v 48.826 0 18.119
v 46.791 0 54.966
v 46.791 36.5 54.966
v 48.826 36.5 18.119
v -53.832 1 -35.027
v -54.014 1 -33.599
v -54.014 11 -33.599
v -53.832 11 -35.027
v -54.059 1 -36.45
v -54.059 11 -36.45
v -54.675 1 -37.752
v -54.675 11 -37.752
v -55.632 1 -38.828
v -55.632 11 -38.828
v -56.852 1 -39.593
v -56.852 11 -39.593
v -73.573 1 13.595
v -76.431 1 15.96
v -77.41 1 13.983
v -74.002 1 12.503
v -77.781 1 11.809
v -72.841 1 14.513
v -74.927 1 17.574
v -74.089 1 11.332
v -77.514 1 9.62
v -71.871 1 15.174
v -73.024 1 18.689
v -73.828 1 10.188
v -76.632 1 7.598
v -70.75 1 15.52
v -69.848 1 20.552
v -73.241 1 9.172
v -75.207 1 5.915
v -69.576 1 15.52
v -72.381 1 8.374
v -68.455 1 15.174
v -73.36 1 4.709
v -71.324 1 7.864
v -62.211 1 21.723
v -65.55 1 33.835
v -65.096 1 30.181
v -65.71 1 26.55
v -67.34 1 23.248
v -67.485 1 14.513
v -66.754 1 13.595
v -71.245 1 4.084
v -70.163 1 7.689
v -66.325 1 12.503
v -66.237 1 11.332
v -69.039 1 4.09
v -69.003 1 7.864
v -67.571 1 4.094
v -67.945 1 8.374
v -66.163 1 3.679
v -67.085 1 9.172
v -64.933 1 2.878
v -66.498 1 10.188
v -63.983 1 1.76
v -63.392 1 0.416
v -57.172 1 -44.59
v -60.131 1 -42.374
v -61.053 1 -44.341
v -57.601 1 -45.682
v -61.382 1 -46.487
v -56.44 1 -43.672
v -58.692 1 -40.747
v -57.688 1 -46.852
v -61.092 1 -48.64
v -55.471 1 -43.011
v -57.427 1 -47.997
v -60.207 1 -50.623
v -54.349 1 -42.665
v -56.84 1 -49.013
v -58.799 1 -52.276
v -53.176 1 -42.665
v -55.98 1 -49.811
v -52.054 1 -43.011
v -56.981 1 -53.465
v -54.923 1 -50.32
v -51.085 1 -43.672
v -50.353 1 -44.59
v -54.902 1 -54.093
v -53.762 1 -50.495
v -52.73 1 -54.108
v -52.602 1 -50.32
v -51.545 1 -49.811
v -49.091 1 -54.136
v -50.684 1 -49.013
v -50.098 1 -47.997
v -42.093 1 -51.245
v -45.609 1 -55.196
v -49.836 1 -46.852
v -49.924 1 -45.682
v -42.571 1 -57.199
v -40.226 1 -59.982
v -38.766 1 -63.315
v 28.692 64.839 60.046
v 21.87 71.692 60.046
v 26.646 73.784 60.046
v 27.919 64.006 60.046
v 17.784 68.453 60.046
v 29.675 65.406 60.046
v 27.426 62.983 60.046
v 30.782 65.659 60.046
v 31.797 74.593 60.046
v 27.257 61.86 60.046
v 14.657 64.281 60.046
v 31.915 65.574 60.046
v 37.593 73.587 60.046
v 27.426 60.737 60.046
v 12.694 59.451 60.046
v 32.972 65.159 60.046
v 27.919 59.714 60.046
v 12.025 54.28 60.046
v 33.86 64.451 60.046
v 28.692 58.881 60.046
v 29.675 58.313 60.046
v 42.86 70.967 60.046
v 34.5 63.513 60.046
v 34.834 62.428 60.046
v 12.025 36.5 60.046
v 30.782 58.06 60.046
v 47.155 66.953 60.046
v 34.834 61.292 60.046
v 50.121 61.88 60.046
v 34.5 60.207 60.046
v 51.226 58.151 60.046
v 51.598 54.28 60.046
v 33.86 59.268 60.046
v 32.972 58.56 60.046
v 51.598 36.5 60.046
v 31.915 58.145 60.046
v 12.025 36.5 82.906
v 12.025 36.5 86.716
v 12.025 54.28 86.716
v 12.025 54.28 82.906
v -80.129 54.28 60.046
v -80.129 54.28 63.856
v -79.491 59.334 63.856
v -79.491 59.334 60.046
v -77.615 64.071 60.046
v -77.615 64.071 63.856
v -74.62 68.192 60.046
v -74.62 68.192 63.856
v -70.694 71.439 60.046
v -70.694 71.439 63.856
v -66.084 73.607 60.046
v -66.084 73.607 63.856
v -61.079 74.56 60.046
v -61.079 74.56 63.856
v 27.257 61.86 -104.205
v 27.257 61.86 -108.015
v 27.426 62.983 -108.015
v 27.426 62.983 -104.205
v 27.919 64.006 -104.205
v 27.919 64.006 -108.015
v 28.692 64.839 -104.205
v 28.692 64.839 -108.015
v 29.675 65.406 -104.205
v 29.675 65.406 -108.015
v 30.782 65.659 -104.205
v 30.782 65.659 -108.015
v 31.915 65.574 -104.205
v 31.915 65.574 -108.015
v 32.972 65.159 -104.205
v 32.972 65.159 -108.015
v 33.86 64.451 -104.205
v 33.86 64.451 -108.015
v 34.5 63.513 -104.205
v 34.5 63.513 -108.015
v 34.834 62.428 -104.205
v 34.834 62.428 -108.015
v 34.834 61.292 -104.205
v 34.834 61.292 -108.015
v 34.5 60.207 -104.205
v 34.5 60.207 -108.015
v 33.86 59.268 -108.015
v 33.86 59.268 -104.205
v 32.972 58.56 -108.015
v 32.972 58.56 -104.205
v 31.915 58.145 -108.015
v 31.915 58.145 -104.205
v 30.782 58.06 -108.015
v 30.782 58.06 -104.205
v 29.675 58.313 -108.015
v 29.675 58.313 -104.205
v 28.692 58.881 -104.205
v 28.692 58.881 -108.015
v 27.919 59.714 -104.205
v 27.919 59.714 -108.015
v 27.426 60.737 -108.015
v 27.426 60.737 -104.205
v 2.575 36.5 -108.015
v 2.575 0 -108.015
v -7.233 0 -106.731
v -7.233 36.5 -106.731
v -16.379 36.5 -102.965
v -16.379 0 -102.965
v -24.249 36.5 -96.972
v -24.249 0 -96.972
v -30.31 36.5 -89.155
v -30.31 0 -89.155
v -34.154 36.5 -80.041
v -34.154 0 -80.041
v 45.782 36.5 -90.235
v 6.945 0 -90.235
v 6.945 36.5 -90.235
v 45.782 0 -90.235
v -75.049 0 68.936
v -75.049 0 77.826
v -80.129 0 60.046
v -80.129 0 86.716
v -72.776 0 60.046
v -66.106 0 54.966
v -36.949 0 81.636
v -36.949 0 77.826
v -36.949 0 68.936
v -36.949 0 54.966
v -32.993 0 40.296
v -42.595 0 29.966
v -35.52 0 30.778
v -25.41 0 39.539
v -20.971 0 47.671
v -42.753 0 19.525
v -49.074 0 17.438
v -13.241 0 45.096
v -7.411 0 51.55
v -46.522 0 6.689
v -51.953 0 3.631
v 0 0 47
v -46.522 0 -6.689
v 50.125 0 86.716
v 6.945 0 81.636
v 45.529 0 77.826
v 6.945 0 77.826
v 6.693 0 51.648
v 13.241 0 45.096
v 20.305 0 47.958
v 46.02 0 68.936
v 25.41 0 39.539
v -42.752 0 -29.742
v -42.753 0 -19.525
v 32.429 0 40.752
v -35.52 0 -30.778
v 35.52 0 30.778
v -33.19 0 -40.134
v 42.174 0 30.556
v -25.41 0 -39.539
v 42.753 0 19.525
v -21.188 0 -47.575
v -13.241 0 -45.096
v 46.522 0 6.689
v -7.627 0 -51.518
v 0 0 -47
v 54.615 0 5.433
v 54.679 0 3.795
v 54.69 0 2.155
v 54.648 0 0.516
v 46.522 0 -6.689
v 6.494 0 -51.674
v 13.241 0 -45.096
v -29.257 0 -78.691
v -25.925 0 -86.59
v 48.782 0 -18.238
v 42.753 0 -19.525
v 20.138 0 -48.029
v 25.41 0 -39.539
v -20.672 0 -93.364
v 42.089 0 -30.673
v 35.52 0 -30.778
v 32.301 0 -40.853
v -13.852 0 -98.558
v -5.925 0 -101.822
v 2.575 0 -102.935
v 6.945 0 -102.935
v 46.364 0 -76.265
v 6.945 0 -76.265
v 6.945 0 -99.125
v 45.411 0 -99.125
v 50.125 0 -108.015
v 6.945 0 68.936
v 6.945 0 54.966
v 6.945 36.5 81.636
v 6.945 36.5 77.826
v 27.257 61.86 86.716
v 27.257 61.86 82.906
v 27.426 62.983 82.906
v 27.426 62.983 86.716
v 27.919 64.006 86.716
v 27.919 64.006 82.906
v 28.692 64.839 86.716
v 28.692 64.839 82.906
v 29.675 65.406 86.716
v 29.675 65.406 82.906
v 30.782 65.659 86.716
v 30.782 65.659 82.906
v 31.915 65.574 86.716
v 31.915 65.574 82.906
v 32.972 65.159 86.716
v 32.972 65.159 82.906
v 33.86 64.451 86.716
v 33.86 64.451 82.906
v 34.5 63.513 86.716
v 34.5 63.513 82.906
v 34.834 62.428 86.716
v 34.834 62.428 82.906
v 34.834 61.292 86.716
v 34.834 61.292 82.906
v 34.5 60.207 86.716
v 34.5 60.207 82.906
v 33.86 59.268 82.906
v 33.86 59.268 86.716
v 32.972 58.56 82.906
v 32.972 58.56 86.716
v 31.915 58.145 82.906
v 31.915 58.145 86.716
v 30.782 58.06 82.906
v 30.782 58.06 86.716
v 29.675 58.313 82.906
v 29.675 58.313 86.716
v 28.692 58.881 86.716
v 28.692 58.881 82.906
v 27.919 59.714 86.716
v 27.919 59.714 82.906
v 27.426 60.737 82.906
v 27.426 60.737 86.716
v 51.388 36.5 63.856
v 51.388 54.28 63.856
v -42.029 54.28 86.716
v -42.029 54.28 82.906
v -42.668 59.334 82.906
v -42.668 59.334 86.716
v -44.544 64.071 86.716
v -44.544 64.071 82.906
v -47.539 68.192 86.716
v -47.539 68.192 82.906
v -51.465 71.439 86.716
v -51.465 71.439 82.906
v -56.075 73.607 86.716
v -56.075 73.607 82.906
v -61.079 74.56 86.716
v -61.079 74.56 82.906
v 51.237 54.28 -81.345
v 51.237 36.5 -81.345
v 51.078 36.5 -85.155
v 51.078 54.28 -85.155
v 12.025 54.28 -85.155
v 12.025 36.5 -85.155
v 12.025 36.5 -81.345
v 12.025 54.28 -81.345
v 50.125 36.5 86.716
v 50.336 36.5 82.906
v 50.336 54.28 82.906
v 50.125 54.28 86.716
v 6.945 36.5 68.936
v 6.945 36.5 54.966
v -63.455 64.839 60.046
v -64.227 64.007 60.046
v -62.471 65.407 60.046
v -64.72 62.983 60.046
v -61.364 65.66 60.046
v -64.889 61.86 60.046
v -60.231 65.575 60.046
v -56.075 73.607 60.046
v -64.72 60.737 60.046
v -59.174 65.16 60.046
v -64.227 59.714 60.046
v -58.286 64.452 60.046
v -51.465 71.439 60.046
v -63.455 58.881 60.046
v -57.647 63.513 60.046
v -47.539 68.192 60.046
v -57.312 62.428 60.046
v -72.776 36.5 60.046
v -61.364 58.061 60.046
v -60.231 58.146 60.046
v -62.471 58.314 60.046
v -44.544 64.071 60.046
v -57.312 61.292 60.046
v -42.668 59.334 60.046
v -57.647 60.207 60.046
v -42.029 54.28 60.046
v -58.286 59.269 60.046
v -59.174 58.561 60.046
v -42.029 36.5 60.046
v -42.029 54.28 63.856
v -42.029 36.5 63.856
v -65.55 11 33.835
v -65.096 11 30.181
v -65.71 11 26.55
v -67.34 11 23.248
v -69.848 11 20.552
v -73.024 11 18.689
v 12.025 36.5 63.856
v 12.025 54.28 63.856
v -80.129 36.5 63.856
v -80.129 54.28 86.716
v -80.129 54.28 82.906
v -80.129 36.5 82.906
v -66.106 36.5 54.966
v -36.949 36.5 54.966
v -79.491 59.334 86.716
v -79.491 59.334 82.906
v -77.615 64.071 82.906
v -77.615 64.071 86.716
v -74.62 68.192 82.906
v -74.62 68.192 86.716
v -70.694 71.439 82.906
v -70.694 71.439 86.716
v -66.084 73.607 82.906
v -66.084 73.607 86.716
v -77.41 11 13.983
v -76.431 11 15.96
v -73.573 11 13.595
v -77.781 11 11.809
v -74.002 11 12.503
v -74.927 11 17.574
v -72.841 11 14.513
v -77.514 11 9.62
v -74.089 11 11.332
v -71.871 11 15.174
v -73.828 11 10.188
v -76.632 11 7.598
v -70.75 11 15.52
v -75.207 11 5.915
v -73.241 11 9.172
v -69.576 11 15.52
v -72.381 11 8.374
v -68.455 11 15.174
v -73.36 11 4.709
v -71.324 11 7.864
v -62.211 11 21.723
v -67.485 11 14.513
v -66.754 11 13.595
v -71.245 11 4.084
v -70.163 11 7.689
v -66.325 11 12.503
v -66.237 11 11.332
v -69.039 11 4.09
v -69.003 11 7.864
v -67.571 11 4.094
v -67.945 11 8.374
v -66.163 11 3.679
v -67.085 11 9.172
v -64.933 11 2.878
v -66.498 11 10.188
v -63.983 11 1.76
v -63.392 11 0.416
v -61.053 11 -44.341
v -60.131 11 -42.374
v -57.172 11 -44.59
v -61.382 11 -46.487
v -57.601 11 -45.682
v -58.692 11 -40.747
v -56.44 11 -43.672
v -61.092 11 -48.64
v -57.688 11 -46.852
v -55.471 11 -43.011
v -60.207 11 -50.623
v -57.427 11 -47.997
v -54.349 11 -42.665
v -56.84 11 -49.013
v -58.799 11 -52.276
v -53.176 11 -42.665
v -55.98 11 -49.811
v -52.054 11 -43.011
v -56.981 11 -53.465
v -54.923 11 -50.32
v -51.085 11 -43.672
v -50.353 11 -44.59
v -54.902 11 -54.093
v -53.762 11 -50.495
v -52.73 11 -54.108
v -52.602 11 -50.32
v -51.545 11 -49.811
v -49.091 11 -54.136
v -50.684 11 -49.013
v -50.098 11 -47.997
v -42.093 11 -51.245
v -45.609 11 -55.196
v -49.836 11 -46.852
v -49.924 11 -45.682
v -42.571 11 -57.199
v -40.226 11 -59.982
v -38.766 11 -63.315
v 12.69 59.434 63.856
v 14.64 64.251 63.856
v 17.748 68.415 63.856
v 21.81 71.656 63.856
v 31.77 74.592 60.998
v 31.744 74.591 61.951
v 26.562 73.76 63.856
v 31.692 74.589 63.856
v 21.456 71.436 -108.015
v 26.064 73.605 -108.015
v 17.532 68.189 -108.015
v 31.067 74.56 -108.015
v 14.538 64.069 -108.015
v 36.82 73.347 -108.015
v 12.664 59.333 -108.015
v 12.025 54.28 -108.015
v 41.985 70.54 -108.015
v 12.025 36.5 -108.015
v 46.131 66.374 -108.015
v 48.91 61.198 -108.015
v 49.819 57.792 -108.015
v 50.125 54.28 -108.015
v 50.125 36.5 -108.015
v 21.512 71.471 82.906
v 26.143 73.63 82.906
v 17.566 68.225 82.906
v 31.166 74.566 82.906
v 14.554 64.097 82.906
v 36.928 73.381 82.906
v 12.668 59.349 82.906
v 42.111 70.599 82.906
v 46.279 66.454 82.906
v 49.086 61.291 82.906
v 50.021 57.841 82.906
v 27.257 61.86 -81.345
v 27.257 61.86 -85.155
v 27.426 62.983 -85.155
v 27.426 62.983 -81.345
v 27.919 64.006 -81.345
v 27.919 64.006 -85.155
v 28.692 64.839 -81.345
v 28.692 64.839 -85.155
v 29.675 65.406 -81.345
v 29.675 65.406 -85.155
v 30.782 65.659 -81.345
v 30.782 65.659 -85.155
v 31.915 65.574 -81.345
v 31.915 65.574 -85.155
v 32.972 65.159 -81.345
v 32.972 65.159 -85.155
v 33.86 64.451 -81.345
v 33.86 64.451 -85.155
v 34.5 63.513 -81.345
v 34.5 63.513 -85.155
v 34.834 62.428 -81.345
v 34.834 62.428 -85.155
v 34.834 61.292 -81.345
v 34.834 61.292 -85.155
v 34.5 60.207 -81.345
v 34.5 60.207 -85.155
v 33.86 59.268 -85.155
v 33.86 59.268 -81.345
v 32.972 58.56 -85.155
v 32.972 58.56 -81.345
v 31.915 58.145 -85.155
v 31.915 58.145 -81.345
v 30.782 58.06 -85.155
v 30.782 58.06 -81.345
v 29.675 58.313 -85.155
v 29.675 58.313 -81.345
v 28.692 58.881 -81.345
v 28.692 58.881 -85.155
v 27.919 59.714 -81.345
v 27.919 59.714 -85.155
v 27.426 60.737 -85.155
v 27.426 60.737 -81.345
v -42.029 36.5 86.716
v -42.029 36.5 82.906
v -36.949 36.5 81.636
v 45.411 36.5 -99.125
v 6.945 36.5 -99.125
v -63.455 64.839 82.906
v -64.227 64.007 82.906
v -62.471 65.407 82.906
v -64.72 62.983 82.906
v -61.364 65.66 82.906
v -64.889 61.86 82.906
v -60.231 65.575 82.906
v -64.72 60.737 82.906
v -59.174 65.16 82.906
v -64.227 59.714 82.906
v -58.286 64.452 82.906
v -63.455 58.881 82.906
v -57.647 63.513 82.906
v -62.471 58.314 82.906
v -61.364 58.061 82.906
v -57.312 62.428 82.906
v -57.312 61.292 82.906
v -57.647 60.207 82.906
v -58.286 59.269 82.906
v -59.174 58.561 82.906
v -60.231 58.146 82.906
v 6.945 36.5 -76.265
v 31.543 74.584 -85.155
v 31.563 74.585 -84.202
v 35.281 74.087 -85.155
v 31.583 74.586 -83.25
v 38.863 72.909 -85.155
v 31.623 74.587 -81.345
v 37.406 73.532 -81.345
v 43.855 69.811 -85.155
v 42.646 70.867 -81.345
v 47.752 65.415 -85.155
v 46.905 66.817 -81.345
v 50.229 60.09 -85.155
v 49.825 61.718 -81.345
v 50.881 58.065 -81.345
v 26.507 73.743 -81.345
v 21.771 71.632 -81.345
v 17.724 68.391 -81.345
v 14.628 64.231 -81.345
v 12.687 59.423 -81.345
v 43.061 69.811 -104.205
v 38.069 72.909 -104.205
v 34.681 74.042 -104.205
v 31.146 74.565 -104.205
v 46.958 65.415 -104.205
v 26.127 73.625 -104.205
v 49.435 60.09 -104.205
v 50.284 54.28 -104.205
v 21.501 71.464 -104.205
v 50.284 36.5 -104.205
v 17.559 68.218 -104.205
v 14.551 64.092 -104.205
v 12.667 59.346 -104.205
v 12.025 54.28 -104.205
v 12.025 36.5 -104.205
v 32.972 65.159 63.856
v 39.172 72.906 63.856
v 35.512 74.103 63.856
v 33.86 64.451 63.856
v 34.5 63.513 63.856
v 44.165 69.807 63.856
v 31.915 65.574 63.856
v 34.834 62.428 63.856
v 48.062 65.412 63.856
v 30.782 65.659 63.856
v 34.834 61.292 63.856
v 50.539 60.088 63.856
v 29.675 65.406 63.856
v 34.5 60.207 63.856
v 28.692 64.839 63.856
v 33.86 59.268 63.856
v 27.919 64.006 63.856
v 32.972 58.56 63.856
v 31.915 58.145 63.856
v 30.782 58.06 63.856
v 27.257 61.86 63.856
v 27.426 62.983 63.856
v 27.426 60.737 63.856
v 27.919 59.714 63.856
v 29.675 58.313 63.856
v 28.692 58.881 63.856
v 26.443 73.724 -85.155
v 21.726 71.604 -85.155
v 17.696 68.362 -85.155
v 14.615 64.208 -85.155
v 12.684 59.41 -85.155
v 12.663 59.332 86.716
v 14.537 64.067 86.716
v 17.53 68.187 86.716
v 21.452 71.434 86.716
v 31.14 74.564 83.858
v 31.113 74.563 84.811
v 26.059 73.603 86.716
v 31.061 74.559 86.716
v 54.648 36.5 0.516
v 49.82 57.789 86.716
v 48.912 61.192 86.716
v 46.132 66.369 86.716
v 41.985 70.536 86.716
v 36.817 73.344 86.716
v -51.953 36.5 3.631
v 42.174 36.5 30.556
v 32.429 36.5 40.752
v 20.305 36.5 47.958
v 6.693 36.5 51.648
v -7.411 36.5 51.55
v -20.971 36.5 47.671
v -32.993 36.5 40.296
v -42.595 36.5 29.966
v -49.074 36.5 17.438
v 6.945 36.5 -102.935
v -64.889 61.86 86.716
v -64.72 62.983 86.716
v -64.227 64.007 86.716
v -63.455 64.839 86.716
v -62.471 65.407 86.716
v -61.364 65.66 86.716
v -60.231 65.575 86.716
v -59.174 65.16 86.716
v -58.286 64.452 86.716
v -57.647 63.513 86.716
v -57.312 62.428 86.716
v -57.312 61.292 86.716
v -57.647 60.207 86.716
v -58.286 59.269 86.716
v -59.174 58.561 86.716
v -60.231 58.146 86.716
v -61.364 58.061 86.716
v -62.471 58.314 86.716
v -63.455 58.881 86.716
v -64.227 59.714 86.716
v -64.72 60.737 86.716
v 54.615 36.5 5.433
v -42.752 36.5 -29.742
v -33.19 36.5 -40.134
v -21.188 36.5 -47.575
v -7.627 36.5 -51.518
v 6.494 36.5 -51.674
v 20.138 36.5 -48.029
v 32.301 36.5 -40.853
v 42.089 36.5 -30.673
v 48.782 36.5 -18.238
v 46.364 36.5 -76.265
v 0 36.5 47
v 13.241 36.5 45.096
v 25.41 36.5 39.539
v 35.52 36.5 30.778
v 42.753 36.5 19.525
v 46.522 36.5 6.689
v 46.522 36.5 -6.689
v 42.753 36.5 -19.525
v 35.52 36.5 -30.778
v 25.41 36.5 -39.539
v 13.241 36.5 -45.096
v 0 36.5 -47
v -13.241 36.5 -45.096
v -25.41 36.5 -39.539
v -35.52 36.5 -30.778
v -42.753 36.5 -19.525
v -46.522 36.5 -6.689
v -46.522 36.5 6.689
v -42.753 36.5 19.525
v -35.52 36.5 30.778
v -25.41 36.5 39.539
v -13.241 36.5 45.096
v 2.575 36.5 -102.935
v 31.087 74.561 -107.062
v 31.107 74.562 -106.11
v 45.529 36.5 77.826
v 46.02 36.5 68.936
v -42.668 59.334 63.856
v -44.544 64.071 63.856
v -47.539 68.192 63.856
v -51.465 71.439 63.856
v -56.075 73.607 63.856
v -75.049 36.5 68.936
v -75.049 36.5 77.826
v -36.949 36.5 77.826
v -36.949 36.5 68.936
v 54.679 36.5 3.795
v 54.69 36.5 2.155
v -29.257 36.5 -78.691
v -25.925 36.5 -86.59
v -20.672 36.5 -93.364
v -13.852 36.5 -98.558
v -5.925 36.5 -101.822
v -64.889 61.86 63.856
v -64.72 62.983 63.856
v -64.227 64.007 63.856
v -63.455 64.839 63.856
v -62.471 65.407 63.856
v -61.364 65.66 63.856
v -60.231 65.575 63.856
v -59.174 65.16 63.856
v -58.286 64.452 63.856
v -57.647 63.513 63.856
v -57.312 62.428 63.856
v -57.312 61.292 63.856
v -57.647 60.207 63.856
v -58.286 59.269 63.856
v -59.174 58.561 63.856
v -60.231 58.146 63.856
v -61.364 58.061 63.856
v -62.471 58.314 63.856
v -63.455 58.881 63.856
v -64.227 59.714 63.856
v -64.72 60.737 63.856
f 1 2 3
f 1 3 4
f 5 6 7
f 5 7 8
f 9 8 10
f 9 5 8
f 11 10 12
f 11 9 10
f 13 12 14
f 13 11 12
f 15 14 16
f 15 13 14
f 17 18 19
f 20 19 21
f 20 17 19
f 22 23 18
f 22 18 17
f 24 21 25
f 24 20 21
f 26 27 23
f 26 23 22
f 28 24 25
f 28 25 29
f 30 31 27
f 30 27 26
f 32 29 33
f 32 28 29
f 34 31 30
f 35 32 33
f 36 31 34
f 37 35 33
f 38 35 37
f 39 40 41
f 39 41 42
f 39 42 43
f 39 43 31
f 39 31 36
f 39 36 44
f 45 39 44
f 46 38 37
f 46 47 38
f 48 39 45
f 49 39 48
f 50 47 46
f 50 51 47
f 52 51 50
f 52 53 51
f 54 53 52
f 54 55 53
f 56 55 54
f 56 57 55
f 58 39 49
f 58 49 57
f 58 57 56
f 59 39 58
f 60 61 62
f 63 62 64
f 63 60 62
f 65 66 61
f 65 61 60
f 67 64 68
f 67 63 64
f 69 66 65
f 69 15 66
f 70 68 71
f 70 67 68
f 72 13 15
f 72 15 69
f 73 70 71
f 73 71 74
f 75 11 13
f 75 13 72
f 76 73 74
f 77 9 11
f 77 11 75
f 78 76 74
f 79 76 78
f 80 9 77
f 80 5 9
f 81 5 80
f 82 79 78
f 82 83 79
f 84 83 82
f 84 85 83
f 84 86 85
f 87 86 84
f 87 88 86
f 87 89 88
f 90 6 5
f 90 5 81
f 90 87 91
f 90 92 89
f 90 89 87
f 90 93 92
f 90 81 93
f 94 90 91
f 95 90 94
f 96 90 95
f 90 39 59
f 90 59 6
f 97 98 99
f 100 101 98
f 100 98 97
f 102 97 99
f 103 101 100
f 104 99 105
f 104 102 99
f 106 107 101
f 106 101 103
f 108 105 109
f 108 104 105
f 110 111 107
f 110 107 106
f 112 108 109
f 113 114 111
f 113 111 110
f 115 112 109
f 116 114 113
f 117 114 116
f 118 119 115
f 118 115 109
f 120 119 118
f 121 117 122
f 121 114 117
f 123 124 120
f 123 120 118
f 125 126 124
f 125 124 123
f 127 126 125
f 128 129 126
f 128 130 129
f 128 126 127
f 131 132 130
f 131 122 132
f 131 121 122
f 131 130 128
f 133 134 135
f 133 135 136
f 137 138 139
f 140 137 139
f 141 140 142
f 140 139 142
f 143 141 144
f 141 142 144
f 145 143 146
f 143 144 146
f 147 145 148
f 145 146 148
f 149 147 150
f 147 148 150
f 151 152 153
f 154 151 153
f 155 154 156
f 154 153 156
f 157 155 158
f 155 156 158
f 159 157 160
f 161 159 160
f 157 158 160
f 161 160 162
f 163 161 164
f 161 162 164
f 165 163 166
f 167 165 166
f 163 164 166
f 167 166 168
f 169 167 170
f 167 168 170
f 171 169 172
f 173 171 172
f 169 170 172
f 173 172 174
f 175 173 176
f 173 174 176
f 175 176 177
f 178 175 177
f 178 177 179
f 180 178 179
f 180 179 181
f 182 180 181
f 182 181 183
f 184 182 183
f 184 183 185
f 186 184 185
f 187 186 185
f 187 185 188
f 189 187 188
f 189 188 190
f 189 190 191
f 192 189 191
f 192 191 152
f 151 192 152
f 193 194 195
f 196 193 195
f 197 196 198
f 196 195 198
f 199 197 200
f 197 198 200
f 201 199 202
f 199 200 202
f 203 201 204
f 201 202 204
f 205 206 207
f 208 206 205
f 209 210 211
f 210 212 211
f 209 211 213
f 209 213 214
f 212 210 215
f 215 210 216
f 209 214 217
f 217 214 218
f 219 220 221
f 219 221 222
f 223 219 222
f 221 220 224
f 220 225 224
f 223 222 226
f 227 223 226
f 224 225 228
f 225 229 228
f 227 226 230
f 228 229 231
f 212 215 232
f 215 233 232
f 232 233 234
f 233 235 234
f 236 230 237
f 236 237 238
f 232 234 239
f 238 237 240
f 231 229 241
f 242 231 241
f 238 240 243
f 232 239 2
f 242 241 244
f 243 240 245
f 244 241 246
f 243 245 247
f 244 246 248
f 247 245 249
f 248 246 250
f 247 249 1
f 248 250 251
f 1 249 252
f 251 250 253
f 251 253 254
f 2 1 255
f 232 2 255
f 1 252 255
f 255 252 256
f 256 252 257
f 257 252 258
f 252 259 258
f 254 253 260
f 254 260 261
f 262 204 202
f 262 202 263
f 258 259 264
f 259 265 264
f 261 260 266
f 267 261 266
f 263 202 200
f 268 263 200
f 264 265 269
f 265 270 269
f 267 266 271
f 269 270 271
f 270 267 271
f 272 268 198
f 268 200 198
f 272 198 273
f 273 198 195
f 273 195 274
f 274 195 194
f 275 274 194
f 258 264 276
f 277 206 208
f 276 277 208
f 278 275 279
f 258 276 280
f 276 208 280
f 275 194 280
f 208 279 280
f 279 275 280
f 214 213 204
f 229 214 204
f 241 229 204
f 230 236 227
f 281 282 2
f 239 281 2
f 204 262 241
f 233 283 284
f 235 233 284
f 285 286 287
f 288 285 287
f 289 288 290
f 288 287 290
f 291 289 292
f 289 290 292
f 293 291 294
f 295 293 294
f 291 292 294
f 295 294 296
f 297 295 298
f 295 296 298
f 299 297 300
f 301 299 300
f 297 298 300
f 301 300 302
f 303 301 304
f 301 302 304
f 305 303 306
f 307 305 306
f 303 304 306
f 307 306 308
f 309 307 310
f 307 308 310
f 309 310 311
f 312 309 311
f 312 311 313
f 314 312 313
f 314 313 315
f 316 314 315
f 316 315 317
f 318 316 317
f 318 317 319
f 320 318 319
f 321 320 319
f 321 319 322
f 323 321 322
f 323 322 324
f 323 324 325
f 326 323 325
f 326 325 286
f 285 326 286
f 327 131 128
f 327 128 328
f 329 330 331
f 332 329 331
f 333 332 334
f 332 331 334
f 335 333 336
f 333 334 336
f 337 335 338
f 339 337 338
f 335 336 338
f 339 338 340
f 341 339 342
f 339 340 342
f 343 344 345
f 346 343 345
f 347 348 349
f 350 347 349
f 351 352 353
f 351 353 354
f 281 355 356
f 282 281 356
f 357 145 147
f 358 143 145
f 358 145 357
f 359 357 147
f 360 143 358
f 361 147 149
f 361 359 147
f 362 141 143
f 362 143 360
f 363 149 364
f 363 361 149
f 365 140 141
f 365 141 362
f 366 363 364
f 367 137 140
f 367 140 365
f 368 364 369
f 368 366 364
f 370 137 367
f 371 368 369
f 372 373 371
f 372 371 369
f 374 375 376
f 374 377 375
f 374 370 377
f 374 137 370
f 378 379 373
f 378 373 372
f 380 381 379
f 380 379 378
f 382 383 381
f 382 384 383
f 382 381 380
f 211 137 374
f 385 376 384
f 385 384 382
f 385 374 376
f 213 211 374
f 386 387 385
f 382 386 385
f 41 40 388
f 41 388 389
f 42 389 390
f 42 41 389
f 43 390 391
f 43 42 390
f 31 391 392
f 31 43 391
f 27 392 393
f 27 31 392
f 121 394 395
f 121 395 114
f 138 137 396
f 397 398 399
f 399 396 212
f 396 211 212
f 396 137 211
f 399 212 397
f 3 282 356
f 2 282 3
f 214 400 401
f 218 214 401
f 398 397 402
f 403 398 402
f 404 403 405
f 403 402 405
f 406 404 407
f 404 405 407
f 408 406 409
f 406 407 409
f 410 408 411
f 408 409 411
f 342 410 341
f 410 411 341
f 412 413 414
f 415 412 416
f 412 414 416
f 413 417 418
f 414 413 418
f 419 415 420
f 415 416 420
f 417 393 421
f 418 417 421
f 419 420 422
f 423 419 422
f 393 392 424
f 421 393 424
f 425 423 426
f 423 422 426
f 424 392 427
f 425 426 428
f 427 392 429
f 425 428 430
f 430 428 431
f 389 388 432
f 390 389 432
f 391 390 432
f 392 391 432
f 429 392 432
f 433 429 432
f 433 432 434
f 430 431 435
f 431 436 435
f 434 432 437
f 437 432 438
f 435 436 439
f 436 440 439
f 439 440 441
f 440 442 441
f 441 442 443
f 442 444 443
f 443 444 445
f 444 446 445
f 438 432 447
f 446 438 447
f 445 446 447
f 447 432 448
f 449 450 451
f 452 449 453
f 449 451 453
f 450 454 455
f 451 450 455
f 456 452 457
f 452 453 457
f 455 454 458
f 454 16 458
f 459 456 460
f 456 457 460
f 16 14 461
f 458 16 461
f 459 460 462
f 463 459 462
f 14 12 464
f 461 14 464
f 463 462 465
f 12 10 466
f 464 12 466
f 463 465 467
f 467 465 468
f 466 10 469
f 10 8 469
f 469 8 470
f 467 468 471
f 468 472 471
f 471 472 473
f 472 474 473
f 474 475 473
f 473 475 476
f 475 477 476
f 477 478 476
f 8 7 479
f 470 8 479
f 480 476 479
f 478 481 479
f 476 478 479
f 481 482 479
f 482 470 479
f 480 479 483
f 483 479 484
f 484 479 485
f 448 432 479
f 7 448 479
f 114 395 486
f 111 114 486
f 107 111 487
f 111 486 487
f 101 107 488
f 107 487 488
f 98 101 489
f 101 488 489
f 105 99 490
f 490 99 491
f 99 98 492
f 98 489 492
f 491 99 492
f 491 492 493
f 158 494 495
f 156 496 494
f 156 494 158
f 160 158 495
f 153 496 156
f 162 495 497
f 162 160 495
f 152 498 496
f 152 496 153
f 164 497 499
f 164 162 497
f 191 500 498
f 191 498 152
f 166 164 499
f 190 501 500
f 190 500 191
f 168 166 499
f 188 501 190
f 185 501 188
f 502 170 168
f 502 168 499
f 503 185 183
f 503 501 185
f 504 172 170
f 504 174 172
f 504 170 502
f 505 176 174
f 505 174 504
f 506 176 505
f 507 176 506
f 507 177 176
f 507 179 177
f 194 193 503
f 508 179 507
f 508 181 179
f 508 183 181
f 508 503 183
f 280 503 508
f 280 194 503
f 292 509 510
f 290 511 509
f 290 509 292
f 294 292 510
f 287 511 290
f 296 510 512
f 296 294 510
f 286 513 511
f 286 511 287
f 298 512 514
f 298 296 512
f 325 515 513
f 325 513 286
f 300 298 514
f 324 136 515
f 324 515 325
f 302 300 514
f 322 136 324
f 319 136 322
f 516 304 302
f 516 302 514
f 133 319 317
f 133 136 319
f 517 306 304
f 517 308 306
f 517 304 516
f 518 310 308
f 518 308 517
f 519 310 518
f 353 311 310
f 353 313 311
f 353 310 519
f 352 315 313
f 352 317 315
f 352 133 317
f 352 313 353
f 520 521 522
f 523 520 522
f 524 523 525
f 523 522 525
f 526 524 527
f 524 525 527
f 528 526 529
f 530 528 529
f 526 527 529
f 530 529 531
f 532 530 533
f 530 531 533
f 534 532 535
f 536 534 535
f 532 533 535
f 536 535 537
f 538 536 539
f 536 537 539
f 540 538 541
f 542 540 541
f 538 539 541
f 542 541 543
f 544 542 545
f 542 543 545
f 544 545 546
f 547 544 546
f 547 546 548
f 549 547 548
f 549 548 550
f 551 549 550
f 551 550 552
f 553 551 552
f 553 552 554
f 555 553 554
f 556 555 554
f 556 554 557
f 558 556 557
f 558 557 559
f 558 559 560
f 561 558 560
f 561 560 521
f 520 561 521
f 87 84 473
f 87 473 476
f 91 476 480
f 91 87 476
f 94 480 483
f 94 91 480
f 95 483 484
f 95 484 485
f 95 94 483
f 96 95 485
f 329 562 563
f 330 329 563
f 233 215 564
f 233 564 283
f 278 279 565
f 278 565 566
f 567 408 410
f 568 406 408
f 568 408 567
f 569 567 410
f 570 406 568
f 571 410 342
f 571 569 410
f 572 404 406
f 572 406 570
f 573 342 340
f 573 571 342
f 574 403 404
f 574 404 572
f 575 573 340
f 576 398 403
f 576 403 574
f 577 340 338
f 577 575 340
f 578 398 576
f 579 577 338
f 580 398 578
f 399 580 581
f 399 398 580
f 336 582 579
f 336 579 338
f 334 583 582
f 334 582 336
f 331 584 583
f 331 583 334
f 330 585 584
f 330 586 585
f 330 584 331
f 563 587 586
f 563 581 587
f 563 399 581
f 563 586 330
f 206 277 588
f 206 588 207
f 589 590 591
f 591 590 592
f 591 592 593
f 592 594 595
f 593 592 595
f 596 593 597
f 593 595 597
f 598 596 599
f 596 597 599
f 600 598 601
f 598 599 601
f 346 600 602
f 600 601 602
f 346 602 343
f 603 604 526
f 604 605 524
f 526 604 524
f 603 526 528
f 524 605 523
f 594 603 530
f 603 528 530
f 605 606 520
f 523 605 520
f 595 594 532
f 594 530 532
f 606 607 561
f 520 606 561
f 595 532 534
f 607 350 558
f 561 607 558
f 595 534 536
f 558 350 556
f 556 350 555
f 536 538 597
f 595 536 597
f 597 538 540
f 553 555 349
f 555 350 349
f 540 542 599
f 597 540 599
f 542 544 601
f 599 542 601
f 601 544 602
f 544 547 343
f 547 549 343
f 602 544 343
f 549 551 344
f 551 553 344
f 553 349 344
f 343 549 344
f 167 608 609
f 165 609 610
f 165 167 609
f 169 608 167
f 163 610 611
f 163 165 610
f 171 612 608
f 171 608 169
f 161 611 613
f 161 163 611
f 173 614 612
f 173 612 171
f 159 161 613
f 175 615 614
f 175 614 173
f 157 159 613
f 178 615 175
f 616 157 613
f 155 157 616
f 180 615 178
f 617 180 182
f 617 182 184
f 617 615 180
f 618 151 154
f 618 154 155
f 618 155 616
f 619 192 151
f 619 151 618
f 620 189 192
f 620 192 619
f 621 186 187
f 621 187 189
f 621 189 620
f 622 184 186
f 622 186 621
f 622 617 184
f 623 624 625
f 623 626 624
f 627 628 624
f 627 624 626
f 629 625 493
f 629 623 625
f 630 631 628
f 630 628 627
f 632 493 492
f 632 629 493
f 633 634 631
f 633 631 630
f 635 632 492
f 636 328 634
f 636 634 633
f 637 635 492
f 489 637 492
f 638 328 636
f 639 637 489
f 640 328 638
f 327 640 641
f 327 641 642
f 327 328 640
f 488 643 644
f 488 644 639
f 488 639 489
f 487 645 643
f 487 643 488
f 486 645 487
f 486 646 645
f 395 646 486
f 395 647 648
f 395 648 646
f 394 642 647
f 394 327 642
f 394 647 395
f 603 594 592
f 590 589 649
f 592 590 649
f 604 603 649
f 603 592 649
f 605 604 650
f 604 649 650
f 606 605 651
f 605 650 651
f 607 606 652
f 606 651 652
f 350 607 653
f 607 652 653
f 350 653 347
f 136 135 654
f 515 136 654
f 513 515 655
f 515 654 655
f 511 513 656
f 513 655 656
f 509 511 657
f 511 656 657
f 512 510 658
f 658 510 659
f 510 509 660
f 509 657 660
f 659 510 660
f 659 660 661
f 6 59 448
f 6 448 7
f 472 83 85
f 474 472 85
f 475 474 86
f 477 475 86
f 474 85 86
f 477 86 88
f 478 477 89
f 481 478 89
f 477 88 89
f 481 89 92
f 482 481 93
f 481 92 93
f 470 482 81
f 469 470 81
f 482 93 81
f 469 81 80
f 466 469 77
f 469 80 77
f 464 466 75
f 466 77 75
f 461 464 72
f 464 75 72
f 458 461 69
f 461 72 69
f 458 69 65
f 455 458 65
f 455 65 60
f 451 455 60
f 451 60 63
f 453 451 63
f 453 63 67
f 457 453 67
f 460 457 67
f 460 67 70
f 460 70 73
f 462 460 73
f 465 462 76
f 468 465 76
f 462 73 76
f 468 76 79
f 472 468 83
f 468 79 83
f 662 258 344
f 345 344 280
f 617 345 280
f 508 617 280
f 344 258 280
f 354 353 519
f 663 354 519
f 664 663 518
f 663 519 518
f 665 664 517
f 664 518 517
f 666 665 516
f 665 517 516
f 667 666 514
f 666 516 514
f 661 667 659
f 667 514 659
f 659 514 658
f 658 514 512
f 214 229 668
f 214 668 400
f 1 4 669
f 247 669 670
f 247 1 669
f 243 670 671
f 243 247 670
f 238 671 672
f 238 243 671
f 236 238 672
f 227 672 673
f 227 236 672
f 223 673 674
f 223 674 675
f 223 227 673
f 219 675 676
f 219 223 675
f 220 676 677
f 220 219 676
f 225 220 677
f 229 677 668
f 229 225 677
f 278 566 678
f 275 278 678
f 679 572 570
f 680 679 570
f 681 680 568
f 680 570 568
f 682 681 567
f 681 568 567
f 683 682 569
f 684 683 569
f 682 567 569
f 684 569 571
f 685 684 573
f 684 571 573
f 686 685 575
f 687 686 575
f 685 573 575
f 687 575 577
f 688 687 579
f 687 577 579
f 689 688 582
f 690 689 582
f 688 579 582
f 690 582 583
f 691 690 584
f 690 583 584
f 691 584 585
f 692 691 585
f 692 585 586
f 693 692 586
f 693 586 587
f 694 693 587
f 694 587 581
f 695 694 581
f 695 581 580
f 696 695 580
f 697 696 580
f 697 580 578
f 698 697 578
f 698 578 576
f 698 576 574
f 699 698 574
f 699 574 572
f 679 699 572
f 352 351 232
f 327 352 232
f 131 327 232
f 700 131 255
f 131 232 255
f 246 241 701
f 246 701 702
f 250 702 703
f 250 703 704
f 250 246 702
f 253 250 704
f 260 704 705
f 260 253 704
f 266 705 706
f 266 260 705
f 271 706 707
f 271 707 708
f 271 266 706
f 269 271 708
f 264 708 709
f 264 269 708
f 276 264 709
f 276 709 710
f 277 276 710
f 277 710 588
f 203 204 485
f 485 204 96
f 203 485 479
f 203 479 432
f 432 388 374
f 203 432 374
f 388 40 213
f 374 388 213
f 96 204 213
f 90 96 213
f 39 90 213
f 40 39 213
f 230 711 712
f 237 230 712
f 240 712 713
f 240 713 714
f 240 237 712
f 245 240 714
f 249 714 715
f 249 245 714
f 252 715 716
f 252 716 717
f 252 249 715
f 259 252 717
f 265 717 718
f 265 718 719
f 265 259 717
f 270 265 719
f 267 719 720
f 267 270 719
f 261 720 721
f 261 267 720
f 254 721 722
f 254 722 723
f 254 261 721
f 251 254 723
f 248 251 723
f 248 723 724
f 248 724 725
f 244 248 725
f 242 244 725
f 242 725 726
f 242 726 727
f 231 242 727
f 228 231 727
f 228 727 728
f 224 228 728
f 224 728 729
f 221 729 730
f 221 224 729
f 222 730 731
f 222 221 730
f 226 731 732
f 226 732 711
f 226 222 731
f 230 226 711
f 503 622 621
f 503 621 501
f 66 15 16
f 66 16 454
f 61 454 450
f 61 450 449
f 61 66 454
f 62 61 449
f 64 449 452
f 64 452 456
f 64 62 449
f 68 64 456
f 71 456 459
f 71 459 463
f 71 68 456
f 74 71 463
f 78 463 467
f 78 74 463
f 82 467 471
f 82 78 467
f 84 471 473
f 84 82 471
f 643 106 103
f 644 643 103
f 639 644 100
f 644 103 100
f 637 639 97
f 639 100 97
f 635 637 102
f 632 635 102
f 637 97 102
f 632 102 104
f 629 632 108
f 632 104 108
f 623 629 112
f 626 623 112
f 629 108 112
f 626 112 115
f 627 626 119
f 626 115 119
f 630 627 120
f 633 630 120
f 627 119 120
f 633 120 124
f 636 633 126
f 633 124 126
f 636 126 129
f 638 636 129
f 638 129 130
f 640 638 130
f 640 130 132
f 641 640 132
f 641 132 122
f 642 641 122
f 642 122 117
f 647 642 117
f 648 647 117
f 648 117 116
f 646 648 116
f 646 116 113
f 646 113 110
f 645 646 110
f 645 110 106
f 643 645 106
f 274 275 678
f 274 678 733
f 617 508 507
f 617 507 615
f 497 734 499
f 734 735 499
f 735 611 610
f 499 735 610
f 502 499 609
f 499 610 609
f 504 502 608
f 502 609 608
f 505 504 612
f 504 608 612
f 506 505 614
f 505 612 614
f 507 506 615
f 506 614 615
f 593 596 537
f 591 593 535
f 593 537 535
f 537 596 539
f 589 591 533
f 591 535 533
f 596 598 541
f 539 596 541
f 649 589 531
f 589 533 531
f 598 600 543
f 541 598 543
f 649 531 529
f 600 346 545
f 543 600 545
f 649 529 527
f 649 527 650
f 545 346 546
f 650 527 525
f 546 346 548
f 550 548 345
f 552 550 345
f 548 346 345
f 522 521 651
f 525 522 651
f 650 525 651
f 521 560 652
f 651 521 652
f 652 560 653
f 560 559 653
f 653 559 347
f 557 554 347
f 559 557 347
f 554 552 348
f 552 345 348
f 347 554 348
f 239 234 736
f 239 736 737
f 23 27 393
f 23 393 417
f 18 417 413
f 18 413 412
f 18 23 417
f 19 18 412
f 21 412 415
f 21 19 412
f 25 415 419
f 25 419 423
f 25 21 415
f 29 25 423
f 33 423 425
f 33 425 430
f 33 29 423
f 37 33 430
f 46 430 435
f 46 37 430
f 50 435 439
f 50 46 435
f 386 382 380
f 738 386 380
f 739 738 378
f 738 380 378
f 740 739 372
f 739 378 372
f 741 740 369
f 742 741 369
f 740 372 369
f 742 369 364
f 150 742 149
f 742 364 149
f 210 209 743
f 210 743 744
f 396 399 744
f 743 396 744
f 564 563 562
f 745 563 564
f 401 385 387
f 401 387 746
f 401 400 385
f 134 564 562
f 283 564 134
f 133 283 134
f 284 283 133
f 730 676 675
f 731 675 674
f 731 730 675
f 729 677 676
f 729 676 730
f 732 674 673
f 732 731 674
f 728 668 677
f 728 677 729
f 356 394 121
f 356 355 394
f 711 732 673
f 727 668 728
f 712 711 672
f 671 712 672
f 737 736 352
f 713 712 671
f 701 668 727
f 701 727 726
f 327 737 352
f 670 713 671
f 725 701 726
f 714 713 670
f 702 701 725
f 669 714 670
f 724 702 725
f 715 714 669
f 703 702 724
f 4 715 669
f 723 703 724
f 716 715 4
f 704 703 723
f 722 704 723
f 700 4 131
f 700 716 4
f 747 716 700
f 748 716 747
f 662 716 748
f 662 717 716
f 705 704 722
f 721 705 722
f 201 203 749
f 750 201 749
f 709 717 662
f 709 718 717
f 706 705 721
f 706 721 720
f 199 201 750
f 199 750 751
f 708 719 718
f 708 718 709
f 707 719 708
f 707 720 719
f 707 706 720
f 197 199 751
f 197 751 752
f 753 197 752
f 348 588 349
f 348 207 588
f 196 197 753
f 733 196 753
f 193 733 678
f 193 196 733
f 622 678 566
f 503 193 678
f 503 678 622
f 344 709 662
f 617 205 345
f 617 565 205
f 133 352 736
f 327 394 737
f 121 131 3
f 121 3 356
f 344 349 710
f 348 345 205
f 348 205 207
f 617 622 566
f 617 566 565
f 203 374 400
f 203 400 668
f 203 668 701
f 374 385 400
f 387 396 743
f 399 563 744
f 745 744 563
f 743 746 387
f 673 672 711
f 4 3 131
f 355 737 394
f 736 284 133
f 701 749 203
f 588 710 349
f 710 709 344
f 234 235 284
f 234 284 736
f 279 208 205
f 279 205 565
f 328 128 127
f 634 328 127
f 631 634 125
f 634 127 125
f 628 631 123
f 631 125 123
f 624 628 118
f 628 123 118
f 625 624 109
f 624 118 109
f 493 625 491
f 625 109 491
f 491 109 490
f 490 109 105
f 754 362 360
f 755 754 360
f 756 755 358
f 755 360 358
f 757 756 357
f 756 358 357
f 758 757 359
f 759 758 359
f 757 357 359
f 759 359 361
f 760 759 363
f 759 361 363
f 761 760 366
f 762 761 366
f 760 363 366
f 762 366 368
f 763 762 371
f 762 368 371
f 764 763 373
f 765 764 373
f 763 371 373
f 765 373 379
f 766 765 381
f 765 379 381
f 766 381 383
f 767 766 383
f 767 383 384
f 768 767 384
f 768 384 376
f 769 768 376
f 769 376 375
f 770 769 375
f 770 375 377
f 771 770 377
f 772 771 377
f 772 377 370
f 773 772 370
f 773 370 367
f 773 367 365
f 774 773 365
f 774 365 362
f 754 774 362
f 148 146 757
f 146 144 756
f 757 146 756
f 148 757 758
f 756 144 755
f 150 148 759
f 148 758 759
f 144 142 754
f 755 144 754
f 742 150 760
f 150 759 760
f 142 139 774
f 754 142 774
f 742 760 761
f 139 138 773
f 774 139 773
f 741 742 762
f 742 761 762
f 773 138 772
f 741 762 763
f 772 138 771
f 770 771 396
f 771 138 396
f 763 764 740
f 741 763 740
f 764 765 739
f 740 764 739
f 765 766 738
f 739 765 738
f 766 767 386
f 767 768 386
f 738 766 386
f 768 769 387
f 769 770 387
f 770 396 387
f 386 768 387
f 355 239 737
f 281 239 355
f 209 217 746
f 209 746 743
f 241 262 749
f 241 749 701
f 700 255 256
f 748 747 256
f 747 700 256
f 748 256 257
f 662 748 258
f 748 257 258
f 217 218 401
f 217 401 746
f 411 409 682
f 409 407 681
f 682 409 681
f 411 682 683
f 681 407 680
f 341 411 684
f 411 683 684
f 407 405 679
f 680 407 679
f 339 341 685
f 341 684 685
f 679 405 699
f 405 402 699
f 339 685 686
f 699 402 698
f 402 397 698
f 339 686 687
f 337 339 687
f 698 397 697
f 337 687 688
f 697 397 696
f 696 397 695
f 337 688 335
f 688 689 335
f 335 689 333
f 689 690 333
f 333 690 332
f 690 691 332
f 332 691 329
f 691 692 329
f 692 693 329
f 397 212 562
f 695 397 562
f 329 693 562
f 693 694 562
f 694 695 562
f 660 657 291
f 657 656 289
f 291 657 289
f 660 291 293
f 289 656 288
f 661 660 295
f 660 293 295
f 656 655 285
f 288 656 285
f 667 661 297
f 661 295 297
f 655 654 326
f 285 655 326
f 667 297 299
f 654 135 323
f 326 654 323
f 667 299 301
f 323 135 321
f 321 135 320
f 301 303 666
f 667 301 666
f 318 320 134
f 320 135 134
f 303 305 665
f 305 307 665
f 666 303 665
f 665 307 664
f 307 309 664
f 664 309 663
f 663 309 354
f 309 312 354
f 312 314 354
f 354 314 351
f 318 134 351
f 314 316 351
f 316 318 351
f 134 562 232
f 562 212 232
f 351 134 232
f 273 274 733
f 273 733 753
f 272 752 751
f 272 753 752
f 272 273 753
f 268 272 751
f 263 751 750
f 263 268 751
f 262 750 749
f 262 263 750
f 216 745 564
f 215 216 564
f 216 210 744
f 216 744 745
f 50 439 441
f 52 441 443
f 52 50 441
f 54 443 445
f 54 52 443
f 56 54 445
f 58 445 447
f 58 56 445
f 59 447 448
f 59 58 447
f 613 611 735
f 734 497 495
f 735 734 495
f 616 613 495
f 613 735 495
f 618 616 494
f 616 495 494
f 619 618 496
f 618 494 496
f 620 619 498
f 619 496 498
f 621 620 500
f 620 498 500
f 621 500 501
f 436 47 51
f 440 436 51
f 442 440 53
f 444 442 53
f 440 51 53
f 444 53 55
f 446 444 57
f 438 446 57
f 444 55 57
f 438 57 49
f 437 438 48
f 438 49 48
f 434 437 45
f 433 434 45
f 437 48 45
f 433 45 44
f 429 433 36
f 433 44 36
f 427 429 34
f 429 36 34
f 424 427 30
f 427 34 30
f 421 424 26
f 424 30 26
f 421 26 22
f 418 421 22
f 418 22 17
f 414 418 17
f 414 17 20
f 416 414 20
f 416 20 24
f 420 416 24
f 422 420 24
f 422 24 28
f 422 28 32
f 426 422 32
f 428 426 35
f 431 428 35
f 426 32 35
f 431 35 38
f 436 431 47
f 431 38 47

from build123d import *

# Parameters (mm, degrees)
SKETCH1_R            = 47
BASE_DEPTH           = 36.5
SKETCH2_W            = 38.1
SKETCH2_H            = 3.81
A_ARMS_DEPTH         = 38.1
FILLET_A_ARM_TAB_F_R = 20.32
FILLET2_R            = 50.8
SKETCH3_R            = 3.937
BOSS_EXTRUDE3_DEPTH  = 10
FILLET3_R            = 12.7
SKETCH6_R            = 3.81
TAB_HOLES_1_DEPTH    = 224.393667494
SKETCH7_R            = 3.81
TAB_HOLES_2_DEPTH    = 201.571915927
CUT_EXTRUDE2_DEPTH   = 154.791870017


with BuildPart() as part:
    # Sketch1 → Base (new body)
    with BuildSketch(Plane(origin=(0, 0, 0), x_dir=(1, 0, 0), z_dir=(0, 1, 0))):
        with BuildLine():
            Line((-80.129262367, -86.715777422), (50.125302211, -86.715777422))
            Line((50.125302211, -86.715777422), (54.750608495, -2.975412689))
            Line((54.750608495, -2.975412689), (50.125302211, 108.014745968))
            Line((50.125302211, 108.014745968), (2.575336515, 108.014745968))
            ThreePointArc((2.575336515, 108.014745968), (-20.509235608, 100.225016997), (-34.154303257, 80.041125489))
            Line((-34.154303257, 80.041125489), (-72.776330416, -60.045777422))
            Line((-72.776330416, -60.045777422), (-80.129262367, -60.045777422))
            Line((-80.129262367, -60.045777422), (-80.129262367, -86.715777422))
        make_face()
        with Locations(Location((0, 0, 0), (0, 0, 270))):
            Circle(SKETCH1_R, mode=Mode.SUBTRACT)
    extrude(amount=BASE_DEPTH)

    # Sketch2 → A-Arms (add)
    with BuildSketch(Plane(origin=(0, 36.5, 0), x_dir=(1, 0, 0), z_dir=(0, 1, 0))):
        Polygon((50.125302211, 108.014745968), (50.284076801, 104.204745968), (12.025302211, 104.204745968), (12.025302211, 108.014745968), align=None)
        Polygon((12.025302211, -82.905777422), (50.335743341, -82.905777422), (50.125302211, -86.715777422), (12.025302211, -86.715777422), align=None)
        Polygon((12.025302211, 85.154745968), (12.025302211, 81.344745968), (51.236724342, 81.344745968), (51.077949751, 85.154745968), align=None)
        Polygon((12.025302211, -60.045777422), (51.598390118, -60.045777422), (51.387948988, -63.855777422), (12.025302211, -63.855777422), align=None)
        with Locations((-61.079262367, -61.950777422)):
            Rectangle(SKETCH2_W, SKETCH2_H)
        with Locations((-61.079262367, -84.810777422)):
            Rectangle(SKETCH2_W, SKETCH2_H)
    extrude(amount=A_ARMS_DEPTH)

    # Fillet a-arm tab f
    # the kernel refuses this fillet: 20.32 mm, written as the material it takes off along each edge
    with BuildSketch(Plane(origin=(53.137354768, 74.6, 32.183090452), x_dir=(0, -1, 0), z_dir=(-0.055149831244914994, 0, 0.9984780899517313)), Plane(origin=(54.400001545, 74.6, 9.323090452), x_dir=(0, -1, 0), z_dir=(-0.055149831244913544, 0, 0.9984780899517313))) as fillet_a_arm_tab_f_piece_1:
        with BuildLine():
            CenterArc((FILLET_A_ARM_TAB_F_R, -FILLET_A_ARM_TAB_F_R), FILLET_A_ARM_TAB_F_R, 90, 90)
            Line((0, -FILLET_A_ARM_TAB_F_R), (0, 0))
            Line((0, 0), (FILLET_A_ARM_TAB_F_R, 0))
        make_face()
    extrude(amount=105.415807315, mode=Mode.SUBTRACT)
    with BuildSketch(Plane(origin=(12.025302211, 74.6, 137.515777422), x_dir=(1, 0, 0), z_dir=(0, 0, -1)), Plane(origin=(12.025302211, 74.6, -135.954745968), x_dir=(0, -1, 0), z_dir=(0, 0, 1)), Plane(origin=(-80.129262367, 74.6, 137.515777422), x_dir=(1, 0, 0), z_dir=(0, 0, -1))) as fillet_a_arm_tab_f_piece_2:
        with BuildLine():
            CenterArc((FILLET_A_ARM_TAB_F_R, FILLET_A_ARM_TAB_F_R), FILLET_A_ARM_TAB_F_R, 180, 90)
            Line((0, FILLET_A_ARM_TAB_F_R), (0, 0))
            Line((0, 0), (FILLET_A_ARM_TAB_F_R, 0))
        make_face()
    extrude(amount=105.41, mode=Mode.SUBTRACT)
    with BuildSketch(Plane(origin=(12.025302211, 74.6, 114.655777422), x_dir=(0, -1, 0), z_dir=(0, 0, -1)), Plane(origin=(12.025302211, 74.6, -53.404745968), x_dir=(0, -1, 0), z_dir=(0, 0, -1)), Plane(origin=(-42.029262367, 74.6, 32.105777422), x_dir=(0, -1, 0), z_dir=(0, 0, 1)), Plane(origin=(-42.029262367, 74.6, 114.655777422), x_dir=(-1, 0, 0), z_dir=(0, 0, -1)), Plane(origin=(-80.129262367, 74.6, 9.245777422), x_dir=(1, 0, 0), z_dir=(0, 0, 1))) as fillet_a_arm_tab_f_piece_3:
        with BuildLine():
            CenterArc((FILLET_A_ARM_TAB_F_R, -FILLET_A_ARM_TAB_F_R), FILLET_A_ARM_TAB_F_R, 90, 90)
            Line((0, -FILLET_A_ARM_TAB_F_R), (0, 0))
            Line((0, 0), (FILLET_A_ARM_TAB_F_R, 0))
        make_face()
    extrude(amount=105.41, mode=Mode.SUBTRACT)
    with BuildSketch(Plane(origin=(53.351883028, 74.6, -30.588799481), x_dir=(0, -1, 0), z_dir=(-0.04163698201983484, 0, -0.9991328048504263)), Plane(origin=(48.010143525, 74.6, -158.770692454), x_dir=(-0.9991328048504262, 0, 0.04163698201983669), z_dir=(0.0416369820198367, 0, 0.9991328048504262))) as fillet_a_arm_tab_f_piece_4:
        with BuildLine():
            CenterArc((FILLET_A_ARM_TAB_F_R, FILLET_A_ARM_TAB_F_R), FILLET_A_ARM_TAB_F_R, 180, 90)
            Line((0, FILLET_A_ARM_TAB_F_R), (0, 0))
            Line((0, 0), (FILLET_A_ARM_TAB_F_R, 0))
        make_face()
    extrude(amount=105.413306881, mode=Mode.SUBTRACT)

    # Fillet2
    # the kernel refuses this fillet: 50.8 mm, written as the material it takes off along each edge
    with BuildSketch(Plane(origin=(54.750608495, -6.153313098, 2.975412689), x_dir=(-0.05514983124491408, 0, 0.9984780899517313), z_dir=(0, 1, 0))) as fillet2_piece_1:
        with BuildLine():
            CenterArc((FILLET2_R * 0.0484512842399, -FILLET2_R), FILLET2_R, 90, 5.547769732)
            Line((-FILLET2_R * 0.0482243356174, -FILLET2_R * 0.00468405793677), (0, 0))
            Line((0, 0), (FILLET2_R * 0.0484512842399, 0))
        make_face()
    extrude(amount=48.806626197, mode=Mode.SUBTRACT)

    # Sketch3 → Boss-Extrude3 (add)
    with BuildSketch(Plane(origin=(0, 1, 0), x_dir=(-1, 0, 0), z_dir=(0, -1, 0))):
        with BuildLine():
            Line((42.093323872, 51.245308907), (62.210800727, -21.723285296))
            Line((62.210800727, -21.723285296), (72.188506448, -18.972426984))
            ThreePointArc((72.188506448, -18.972426984), (77.618129068, -10.048878041), (69.039031874, -4.089883254))
            ThreePointArc((69.039031874, -4.089883254), (65.518990894, -3.323443269), (63.392280792, -0.415656673))
            Line((63.392280792, -0.415656673), (54.014483076, 33.598783658))
            ThreePointArc((54.014483076, 33.598783658), (54.320283062, 37.122596493), (56.852004495, 39.592648541))
            ThreePointArc((56.852004495, 39.592648541), (60.937845875, 49.122693965), (51.737082765, 53.904097917))
            Line((51.737082765, 53.904097917), (42.093323872, 51.245308907))
        make_face()
        with Locations(Location((70.163230544, -11.62649903, 0), (0, 0, 90))):
            Circle(SKETCH3_R, mode=Mode.SUBTRACT)
        with Locations(Location((53.76235867, 46.558169963, 0), (0, 0, 90))):
            Circle(SKETCH3_R, mode=Mode.SUBTRACT)
    extrude(amount=-BOSS_EXTRUDE3_DEPTH)

    # Fillet3
    # the kernel refuses this fillet: 12.7 mm, written as the material it adds along each edge
    with BuildSketch(Plane(origin=(-42.093323872, 1, -51.245308907), x_dir=(0.26578423939908447, 0, -0.9640325399523867), z_dir=(0, 1, 0))) as fillet3_piece_1:
        with BuildLine():
            CenterArc((12.520298407, 12.7), FILLET3_R, 187.62557017, 82.37442983)
            Line((-0.067388097, 11.014725997), (-1.326156748, 10.846198597))
            ThreePointArc((-1.326156748, 10.846198597), (-1.27, 10.003561596), (-1.27, 0))
            Line((-1.27, 0), (0, -1.27))
            Line((0, -1.27), (12.520298407, -1.27))
            Line((12.520298407, -1.27), (12.520298407, 0))
        make_face()
    extrude(amount=10)
    with BuildSketch(Plane(origin=(-62.210800727, 1, 21.723285296), x_dir=(-0.26578423939908535, 0, 0.9640325399523866), z_dir=(0, 1, 0))) as fillet3_piece_2:
        with BuildLine():
            CenterArc((12.563650525, -12.7), FILLET3_R, 90, 83.358813764)
            Line((-0.051131053, -11.231229858), (-1.312609211, -11.084352844))
            ThreePointArc((-1.312609211, -11.084352844), (-1.27, -10.349967773), (-1.27, 0))
            Line((-1.27, 0), (0, 1.27))
            Line((0, 1.27), (12.563650525, 1.27))
            Line((12.563650525, 1.27), (12.563650525, 0))
        make_face()
    extrude(amount=10)

    # Sketch6 → Tab Holes 1 (cut, through all)
    with BuildSketch(Plane(origin=(0, 0, -108.014745968), x_dir=(-1, 0, 0), z_dir=(0, 0, -1))):
        with Locations((-31.067038594, 61.859754489)):
            Circle(SKETCH6_R)
    extrude(amount=-TAB_HOLES_1_DEPTH, mode=Mode.SUBTRACT)

    # Sketch7 → Tab Holes 2 (cut, through all)
    with BuildSketch(Plane(origin=(0, 0, 60.045777422), x_dir=(-1, 0, 0), z_dir=(0, 0, -1))):
        with Locations((61.079262367, 61.860273667)):
            Circle(SKETCH7_R)
    extrude(amount=-TAB_HOLES_2_DEPTH, mode=Mode.SUBTRACT)

    # Sketch8 → Cut-Extrude2 (cut, through all)
    with BuildSketch(Plane(origin=(0, 0, 0), x_dir=(1, 0, 0), z_dir=(0, 1, 0))):
        with BuildLine():
            Line((-29.257017954, 78.690941553), (-42.752390199, 29.741545559))
            ThreePointArc((-42.752390199, 29.741545559), (6.494009323, 51.673535228), (48.782168121, 18.238050153))
            Line((48.782168121, 18.238050153), (46.36401462, 76.264745968))
            Line((46.36401462, 76.264745968), (6.945302211, 76.264745968))
            Line((6.945302211, 76.264745968), (6.945302211, 90.234745968))
            Line((6.945302211, 90.234745968), (45.781841123, 90.234745968))
            Line((45.781841123, 90.234745968), (45.41136708, 99.124745968))
            Line((45.41136708, 99.124745968), (6.945302211, 99.124745968))
            Line((6.945302211, 99.124745968), (6.945302211, 102.934745968))
            Line((6.945302211, 102.934745968), (2.575336515, 102.934745968))
            ThreePointArc((2.575336515, 102.934745968), (-17.431292658, 96.183647526), (-29.257017954, 78.690941553))
        make_face()
        with BuildLine():
            Line((-75.049262367, -77.825777422), (-36.949262367, -77.825777422))
            Line((-36.949262367, -77.825777422), (-36.949262367, -81.635777422))
            Line((-36.949262367, -81.635777422), (6.945302211, -81.635777422))
            Line((6.945302211, -81.635777422), (6.945302211, -77.825777422))
            Line((6.945302211, -77.825777422), (45.528588426, -77.825777422))
            Line((45.528588426, -77.825777422), (46.019617728, -68.935777422))
            Line((46.019617728, -68.935777422), (6.945302211, -68.935777422))
            Line((6.945302211, -68.935777422), (6.945302211, -54.965777422))
            Line((6.945302211, -54.965777422), (46.791235203, -54.965777422))
            Line((46.791235203, -54.965777422), (48.826411186, -18.119270701))
            ThreePointArc((48.826411186, -18.119270701), (-7.410849482, -51.550031134), (-51.953259135, -3.631152049))
            Line((-51.953259135, -3.631152049), (-66.106240279, -54.965777422))
            Line((-66.106240279, -54.965777422), (-36.949262367, -54.965777422))
            Line((-36.949262367, -54.965777422), (-36.949262367, -68.935777422))
            Line((-36.949262367, -68.935777422), (-75.049262367, -68.935777422))
            Line((-75.049262367, -68.935777422), (-75.049262367, -77.825777422))
        make_face()
    extrude(amount=CUT_EXTRUDE2_DEPTH, mode=Mode.SUBTRACT)


solid = part.part
